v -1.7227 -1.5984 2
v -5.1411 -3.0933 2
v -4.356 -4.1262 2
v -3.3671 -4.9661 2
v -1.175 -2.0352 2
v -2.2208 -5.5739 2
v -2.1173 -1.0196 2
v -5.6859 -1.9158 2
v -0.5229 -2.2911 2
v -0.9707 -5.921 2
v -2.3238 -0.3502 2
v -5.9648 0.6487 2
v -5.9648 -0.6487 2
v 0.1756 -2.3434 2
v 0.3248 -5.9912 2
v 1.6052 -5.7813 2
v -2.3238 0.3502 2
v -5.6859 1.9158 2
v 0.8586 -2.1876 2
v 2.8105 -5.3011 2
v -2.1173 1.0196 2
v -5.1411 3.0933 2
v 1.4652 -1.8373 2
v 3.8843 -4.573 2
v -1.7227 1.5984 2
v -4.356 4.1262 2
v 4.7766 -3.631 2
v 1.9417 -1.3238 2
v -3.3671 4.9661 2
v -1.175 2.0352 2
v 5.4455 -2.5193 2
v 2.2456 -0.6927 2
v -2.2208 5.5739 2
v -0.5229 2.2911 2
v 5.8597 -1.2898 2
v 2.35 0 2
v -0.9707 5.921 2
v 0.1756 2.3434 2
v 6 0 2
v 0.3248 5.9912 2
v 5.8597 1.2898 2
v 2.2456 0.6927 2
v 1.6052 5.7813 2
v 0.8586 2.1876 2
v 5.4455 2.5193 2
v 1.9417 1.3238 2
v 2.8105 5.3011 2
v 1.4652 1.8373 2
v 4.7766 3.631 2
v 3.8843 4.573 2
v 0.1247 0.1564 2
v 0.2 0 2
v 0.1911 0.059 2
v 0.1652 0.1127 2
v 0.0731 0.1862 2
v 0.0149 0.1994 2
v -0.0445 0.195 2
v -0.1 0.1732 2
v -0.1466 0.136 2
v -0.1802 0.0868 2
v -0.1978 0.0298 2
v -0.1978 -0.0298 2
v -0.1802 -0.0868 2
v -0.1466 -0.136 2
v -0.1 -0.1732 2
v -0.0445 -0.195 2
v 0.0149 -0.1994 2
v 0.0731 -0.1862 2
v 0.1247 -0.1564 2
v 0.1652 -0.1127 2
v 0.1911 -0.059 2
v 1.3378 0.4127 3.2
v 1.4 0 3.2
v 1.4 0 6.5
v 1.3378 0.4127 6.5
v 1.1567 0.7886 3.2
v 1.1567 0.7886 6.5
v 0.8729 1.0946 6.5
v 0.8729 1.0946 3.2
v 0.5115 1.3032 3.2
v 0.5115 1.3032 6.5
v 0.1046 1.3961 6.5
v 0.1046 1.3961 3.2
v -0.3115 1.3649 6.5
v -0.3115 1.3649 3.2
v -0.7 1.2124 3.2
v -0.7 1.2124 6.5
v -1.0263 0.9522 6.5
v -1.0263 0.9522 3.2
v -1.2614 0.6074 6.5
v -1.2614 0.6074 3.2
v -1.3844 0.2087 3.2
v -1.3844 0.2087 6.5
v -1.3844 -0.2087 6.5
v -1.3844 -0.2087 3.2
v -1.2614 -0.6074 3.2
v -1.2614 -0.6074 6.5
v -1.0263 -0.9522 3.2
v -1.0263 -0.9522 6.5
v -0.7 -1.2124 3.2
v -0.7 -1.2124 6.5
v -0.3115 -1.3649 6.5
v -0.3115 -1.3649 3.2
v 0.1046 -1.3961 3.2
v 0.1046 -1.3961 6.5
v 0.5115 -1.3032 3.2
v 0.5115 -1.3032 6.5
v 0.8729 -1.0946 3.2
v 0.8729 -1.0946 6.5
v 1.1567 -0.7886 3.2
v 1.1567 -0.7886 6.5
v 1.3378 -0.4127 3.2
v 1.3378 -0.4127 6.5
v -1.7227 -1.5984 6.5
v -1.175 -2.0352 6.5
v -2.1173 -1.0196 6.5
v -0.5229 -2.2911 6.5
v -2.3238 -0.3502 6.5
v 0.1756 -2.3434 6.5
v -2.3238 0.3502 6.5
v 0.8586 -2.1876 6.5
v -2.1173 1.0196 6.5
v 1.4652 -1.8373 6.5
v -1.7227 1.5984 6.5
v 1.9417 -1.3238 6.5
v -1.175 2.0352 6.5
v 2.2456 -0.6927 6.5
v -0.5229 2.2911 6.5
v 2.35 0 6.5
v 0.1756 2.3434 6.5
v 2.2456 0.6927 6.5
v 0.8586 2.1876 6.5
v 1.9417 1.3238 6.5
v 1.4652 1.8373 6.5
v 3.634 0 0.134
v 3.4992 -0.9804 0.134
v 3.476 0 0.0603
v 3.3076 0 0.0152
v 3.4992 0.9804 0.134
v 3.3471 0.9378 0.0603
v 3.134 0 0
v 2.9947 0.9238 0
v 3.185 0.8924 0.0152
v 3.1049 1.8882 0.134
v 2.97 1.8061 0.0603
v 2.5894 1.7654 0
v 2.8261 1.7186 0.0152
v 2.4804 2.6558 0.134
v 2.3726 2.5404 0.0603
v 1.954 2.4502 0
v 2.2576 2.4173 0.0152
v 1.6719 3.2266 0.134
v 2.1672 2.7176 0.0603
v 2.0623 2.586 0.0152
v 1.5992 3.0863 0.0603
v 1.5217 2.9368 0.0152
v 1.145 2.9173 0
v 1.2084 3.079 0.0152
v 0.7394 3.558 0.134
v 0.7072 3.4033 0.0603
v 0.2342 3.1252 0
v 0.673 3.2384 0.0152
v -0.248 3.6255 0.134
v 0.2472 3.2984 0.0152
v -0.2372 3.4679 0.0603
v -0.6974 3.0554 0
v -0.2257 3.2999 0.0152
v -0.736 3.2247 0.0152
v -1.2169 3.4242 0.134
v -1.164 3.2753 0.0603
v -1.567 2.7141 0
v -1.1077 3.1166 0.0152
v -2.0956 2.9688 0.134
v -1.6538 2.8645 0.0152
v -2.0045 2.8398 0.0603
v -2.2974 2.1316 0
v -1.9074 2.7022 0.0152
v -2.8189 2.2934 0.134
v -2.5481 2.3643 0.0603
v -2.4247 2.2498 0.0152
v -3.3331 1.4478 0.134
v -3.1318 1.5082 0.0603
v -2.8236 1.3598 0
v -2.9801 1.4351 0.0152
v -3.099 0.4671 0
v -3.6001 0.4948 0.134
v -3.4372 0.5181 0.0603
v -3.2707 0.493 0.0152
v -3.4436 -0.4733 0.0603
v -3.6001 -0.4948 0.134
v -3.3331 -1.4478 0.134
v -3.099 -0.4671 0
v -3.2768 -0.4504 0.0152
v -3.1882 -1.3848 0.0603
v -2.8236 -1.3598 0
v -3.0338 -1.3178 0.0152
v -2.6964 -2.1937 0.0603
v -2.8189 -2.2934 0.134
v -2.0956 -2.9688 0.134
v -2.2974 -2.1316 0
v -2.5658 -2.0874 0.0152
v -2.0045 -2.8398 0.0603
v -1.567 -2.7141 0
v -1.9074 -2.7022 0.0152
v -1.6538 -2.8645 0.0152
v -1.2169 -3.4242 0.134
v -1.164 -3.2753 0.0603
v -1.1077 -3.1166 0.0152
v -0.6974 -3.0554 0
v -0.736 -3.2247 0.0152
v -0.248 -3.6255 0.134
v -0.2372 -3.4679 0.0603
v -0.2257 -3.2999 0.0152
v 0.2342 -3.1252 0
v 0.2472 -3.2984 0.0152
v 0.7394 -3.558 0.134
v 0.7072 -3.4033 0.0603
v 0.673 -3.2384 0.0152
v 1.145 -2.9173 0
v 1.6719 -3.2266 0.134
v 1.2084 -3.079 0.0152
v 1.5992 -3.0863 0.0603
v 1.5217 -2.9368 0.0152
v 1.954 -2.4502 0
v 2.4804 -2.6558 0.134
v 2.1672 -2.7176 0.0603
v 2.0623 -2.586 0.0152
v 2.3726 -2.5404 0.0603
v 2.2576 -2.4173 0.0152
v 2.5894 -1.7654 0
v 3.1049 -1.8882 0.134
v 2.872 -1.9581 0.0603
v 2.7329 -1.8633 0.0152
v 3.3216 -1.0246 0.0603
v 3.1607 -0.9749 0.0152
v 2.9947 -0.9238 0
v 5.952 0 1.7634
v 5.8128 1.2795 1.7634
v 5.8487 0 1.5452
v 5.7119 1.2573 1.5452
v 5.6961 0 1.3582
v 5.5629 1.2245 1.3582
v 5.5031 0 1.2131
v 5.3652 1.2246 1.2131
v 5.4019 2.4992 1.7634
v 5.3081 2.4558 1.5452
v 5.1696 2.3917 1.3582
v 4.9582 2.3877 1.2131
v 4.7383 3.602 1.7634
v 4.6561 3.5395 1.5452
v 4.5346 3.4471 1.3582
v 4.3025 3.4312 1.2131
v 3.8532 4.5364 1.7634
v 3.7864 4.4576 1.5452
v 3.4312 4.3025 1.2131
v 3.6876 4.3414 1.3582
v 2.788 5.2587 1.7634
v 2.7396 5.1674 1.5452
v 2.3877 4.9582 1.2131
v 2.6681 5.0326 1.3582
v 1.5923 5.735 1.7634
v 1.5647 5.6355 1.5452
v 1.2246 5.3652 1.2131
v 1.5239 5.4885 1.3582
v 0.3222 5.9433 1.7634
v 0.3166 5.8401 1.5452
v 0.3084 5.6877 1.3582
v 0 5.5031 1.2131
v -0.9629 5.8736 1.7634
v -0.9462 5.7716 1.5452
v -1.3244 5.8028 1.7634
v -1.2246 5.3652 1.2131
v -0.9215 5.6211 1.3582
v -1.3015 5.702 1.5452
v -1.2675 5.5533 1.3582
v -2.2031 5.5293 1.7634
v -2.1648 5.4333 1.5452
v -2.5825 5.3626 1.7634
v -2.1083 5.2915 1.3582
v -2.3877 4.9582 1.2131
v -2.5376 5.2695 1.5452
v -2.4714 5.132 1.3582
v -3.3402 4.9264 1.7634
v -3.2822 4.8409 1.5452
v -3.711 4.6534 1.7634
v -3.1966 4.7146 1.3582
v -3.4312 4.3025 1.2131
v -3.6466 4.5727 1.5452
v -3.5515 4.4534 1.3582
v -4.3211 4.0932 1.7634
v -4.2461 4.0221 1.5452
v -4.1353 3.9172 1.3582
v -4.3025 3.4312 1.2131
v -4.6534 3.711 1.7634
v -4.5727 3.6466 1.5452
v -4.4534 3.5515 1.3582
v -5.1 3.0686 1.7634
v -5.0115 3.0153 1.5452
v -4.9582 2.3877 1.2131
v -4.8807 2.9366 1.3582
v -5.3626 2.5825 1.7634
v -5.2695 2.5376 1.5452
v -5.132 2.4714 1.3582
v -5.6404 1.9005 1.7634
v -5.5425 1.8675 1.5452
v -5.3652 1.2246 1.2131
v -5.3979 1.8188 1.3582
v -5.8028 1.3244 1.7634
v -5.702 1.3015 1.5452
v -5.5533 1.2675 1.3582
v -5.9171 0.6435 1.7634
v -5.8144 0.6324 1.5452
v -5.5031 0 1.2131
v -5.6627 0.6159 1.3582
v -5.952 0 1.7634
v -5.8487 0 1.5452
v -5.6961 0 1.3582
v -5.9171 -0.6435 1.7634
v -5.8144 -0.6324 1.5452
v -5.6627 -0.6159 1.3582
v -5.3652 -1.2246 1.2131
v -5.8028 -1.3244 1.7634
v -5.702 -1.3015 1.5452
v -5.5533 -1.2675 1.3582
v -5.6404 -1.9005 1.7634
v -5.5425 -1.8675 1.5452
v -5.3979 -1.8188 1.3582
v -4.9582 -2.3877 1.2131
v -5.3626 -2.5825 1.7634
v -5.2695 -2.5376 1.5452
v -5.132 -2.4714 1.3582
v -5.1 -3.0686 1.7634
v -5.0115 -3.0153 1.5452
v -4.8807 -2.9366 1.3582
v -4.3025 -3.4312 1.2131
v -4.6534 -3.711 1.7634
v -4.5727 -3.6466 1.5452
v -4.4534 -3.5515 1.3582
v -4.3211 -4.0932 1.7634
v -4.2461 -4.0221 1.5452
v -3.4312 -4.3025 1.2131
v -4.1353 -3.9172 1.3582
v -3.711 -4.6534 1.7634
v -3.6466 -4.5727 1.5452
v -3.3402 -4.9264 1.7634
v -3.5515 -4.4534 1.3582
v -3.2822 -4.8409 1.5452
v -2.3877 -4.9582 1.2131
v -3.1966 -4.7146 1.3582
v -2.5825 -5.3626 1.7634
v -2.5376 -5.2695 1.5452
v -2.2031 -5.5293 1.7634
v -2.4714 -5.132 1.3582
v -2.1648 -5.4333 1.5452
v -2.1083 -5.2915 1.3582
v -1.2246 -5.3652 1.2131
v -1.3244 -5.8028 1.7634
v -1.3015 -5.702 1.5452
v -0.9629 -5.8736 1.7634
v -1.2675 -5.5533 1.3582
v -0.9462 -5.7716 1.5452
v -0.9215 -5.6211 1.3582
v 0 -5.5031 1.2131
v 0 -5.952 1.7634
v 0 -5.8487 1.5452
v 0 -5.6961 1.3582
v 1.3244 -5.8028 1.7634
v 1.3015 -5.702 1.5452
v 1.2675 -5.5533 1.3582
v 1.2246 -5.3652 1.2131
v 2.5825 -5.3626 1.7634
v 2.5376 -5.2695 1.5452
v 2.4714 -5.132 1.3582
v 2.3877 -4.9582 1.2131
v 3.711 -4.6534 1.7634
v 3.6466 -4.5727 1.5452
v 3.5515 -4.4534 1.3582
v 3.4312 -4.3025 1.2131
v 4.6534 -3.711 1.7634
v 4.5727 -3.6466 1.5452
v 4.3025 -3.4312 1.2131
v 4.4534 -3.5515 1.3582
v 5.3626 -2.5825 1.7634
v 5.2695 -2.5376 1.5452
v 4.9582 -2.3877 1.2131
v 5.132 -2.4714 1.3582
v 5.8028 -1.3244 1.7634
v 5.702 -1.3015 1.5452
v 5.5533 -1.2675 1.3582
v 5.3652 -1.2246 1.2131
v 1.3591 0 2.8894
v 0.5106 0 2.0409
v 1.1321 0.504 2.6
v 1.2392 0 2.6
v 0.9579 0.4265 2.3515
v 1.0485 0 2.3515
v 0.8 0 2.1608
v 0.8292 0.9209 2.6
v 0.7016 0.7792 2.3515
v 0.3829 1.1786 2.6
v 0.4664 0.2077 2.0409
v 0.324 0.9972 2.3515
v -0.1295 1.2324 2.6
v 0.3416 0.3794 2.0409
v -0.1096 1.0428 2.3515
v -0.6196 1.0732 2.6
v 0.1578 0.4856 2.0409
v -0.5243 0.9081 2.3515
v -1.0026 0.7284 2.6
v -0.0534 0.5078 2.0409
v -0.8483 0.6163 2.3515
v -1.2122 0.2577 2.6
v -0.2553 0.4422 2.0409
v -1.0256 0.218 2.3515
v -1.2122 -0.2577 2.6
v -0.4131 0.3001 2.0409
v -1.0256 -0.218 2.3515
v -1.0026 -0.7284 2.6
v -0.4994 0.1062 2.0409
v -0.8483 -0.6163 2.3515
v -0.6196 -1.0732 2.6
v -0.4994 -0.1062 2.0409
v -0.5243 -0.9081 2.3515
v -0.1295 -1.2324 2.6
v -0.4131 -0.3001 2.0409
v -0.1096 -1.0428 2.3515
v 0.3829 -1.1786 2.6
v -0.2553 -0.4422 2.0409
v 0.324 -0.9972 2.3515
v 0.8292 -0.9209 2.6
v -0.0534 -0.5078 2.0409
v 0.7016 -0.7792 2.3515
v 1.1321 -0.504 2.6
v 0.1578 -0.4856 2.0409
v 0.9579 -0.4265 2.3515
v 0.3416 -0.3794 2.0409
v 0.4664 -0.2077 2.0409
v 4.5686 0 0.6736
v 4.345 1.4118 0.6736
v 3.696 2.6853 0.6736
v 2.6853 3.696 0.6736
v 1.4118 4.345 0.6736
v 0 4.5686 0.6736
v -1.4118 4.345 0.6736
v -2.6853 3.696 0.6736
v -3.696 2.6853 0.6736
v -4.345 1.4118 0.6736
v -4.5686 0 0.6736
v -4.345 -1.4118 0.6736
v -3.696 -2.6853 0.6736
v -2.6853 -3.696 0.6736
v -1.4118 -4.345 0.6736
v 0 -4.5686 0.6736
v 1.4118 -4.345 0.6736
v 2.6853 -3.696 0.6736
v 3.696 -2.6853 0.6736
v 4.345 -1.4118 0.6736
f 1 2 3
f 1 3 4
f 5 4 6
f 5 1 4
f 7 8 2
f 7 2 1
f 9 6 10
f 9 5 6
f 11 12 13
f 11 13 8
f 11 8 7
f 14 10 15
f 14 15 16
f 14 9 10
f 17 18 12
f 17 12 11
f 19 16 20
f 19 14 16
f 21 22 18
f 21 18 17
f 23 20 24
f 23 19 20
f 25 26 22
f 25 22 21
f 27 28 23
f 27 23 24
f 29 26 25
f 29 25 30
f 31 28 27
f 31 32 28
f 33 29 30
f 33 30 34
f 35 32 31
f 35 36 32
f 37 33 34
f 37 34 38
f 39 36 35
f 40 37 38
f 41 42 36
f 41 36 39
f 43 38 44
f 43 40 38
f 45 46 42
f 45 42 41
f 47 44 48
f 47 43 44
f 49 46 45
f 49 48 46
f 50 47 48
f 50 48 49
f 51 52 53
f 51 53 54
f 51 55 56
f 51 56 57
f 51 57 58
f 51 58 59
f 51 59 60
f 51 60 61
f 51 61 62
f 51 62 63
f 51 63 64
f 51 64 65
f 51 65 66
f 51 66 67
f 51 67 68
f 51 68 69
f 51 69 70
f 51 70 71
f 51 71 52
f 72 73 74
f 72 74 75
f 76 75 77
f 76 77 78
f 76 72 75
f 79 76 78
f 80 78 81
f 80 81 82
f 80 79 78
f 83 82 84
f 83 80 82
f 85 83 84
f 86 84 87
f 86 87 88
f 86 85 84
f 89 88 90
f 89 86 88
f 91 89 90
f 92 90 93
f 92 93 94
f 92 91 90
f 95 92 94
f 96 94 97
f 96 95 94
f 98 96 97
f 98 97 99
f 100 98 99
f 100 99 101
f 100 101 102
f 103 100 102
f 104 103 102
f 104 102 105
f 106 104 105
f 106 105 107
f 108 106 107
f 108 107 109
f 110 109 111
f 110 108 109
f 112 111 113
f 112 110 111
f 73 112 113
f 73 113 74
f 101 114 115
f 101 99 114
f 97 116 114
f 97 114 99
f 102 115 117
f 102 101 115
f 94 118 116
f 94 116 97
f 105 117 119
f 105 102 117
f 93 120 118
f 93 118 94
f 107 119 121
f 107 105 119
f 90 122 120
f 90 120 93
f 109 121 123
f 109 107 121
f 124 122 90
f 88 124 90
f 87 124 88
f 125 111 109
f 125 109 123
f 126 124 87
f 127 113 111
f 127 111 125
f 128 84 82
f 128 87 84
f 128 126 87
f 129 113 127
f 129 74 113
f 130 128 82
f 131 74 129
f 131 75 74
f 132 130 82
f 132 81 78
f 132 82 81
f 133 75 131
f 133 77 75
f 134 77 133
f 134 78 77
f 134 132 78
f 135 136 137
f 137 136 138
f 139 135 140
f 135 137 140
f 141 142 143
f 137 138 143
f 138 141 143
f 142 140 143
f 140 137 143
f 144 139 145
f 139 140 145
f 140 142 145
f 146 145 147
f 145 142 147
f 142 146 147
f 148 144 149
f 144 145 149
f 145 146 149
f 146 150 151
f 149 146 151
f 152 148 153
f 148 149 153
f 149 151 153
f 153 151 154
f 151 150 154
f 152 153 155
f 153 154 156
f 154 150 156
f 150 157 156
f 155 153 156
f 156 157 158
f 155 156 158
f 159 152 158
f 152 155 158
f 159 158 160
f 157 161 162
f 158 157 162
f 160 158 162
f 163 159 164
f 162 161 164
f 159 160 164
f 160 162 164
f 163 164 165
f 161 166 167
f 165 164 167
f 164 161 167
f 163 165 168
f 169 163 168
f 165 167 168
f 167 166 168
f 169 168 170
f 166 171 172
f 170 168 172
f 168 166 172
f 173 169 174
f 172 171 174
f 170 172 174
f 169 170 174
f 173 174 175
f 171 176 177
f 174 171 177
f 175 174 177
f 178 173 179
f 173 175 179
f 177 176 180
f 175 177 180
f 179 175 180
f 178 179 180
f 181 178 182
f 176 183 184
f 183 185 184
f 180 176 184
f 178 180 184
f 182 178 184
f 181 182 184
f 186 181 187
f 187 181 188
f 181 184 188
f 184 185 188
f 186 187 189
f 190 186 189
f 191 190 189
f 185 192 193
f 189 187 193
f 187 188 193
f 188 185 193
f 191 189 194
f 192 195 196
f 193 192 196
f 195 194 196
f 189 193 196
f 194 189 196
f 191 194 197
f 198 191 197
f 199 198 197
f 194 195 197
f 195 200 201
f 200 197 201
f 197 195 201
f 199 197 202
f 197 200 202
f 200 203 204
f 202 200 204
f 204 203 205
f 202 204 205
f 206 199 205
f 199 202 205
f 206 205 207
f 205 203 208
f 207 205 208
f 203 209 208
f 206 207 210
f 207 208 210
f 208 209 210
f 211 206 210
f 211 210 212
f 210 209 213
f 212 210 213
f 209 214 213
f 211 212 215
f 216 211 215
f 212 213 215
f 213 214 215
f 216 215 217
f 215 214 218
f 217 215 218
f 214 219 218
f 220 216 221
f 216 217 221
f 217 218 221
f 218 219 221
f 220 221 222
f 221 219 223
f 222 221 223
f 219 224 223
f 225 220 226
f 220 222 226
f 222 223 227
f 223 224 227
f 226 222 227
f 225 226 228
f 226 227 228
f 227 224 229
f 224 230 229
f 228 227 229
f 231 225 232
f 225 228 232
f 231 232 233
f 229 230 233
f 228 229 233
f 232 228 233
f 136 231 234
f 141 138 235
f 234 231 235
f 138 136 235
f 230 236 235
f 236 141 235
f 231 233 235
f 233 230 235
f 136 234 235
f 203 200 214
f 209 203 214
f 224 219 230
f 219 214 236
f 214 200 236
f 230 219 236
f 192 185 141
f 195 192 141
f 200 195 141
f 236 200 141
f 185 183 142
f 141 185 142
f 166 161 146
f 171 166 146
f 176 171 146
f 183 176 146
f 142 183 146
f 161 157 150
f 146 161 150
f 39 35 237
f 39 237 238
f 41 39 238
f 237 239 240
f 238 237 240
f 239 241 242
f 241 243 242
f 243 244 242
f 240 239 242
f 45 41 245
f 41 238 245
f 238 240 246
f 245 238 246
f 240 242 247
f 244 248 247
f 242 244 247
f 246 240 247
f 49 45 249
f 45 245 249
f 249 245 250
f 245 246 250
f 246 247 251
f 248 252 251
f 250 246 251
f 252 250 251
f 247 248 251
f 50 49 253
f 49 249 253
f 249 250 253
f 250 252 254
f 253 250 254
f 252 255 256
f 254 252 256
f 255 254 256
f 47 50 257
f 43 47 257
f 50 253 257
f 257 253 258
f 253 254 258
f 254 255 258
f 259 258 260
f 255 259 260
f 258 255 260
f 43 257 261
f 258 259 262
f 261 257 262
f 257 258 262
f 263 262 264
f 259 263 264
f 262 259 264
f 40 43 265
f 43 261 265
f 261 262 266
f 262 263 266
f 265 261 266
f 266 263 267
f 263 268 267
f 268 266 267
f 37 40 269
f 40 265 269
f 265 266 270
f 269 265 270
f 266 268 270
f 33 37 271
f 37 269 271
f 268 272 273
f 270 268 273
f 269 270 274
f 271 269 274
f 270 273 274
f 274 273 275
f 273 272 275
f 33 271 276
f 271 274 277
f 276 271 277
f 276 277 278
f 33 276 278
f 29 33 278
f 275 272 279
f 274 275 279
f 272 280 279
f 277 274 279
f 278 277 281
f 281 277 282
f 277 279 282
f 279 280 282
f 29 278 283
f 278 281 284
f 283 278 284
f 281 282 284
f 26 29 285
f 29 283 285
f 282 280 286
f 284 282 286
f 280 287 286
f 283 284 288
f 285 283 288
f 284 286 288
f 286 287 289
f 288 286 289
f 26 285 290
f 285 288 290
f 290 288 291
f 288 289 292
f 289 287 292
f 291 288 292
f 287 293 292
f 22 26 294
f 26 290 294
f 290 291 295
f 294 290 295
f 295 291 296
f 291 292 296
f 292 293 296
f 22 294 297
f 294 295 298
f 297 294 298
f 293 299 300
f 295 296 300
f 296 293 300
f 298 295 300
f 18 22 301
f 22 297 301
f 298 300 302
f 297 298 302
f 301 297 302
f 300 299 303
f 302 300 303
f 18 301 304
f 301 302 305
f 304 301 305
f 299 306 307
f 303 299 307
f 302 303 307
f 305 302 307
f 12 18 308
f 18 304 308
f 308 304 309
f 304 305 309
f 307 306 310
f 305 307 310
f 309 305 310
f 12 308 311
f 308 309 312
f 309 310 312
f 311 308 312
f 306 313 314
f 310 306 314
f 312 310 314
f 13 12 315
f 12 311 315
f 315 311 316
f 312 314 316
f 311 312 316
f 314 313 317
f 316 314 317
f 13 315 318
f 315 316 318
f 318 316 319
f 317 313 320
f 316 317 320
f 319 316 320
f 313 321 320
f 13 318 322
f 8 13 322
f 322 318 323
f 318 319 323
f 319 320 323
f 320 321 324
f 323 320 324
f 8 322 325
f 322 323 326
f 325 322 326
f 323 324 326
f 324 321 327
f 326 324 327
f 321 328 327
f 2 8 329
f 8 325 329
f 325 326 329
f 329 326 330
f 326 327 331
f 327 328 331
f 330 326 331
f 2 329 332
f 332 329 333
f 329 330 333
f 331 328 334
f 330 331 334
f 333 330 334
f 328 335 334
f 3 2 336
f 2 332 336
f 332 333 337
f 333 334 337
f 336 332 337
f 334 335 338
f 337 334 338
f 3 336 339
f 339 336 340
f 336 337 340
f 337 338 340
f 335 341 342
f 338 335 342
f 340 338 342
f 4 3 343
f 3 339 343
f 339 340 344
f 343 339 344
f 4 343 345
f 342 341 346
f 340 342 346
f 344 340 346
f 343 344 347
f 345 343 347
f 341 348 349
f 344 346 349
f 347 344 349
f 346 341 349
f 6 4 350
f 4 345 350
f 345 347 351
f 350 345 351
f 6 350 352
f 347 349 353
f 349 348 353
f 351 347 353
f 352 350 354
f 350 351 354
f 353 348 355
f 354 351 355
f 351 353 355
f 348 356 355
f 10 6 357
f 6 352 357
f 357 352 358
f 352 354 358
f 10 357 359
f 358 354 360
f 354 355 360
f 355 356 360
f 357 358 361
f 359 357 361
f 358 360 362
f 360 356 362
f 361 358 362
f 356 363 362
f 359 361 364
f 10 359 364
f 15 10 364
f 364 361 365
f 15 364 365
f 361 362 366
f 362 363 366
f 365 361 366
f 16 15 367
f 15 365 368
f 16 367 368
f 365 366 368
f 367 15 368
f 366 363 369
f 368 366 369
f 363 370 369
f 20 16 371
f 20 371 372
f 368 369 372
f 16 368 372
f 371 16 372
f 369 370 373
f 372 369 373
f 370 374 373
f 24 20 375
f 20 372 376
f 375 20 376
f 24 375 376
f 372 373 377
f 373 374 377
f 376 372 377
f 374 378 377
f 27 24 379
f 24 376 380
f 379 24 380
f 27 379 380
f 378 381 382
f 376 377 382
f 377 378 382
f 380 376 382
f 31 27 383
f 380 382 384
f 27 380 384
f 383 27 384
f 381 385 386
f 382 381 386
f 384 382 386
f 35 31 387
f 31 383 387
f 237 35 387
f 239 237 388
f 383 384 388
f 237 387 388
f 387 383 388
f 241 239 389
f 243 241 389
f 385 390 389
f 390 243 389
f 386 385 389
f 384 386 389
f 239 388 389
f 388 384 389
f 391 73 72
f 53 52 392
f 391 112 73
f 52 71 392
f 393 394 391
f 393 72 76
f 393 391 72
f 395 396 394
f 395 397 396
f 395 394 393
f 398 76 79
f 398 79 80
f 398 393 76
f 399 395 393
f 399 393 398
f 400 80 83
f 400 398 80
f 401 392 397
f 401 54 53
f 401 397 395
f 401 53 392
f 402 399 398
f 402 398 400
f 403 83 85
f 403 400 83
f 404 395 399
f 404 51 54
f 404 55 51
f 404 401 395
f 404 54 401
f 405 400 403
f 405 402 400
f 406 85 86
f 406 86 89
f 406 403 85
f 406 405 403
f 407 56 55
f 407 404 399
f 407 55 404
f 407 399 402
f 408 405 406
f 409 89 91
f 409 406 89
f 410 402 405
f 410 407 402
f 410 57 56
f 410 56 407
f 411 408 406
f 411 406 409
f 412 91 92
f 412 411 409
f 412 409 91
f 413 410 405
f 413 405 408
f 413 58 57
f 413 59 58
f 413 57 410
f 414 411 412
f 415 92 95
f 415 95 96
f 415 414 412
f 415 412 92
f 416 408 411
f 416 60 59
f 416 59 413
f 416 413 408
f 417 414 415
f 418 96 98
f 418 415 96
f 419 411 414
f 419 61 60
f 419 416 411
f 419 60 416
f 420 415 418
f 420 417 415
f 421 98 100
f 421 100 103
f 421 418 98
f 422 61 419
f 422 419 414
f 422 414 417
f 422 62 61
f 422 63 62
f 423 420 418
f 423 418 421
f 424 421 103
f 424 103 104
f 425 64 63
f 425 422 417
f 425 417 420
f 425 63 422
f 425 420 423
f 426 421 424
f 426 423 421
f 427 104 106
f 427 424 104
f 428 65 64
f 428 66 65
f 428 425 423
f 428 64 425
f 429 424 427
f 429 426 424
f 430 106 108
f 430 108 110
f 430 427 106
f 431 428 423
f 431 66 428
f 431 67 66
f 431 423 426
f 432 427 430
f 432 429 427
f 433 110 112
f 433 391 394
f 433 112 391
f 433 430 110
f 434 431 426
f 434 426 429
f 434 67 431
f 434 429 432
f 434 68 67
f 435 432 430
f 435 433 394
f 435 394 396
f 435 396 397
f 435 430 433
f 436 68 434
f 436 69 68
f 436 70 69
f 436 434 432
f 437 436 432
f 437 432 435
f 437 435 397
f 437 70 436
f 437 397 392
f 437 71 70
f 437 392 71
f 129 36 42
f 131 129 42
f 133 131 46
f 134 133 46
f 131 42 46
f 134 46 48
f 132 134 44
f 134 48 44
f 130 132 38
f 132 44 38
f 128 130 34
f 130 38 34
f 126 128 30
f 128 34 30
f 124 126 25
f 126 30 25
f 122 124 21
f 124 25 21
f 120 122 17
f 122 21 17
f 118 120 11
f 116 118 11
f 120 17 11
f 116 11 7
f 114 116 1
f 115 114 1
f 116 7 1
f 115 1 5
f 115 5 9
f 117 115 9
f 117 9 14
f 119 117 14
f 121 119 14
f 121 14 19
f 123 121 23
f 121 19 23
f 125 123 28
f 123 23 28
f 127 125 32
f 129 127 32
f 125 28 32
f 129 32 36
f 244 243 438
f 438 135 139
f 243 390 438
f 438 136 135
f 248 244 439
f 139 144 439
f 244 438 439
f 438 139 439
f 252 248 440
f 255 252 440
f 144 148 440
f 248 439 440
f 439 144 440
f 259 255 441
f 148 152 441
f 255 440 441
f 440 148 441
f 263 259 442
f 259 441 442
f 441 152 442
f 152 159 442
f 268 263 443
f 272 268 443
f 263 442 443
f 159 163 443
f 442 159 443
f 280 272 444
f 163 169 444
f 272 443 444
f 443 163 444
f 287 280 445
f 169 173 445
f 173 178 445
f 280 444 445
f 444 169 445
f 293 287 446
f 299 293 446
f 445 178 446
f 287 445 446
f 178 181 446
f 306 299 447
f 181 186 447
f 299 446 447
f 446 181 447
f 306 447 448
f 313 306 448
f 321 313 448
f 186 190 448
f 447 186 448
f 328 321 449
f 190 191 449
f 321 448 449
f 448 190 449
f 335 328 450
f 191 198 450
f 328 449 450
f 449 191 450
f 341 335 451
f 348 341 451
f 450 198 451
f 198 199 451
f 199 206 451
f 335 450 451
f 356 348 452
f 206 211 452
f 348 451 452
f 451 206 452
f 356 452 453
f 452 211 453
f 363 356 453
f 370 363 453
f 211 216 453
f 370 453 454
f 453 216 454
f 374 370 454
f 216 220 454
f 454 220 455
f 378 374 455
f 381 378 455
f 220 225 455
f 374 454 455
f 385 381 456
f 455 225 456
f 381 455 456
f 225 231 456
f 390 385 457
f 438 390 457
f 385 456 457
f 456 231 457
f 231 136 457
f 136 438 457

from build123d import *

# Parameters (mm, degrees)
F0_R     = 6
F1_DEPTH = 2
F2_SIZE2 = 2.5980762114
F2_SIZE  = 1.5
F4_R     = 2.35
F4_R_2   = 1.4
F5_DEPTH = 4.5
F6_R     = 1.2


# Not quite as in the source:
# - a fillet or chamfer that OpenCascade refuses, or shapes differently, is made with other operations: its cross-section is extruded or revolved along the edge and cut away or added


with BuildPart() as f1:
    # F0 (on Top) → F1 (new body)
    with BuildSketch(Plane.XY):
        Circle(F0_R)
    extrude(amount=F1_DEPTH)

    # F2
    f2_edges = [f1.edges().sort_by_distance(p)[0] for p in [
        (-6, 0, 0),
    ]]
    f2_side = f1.faces().sort_by_distance((-6, 0, 1))[0]
    chamfer(f2_edges, length=F2_SIZE, length2=F2_SIZE2, reference=f2_side)

    # F3: fillet of radius 1 on 2 edges, made by hand

    # F3_s1 → F3_t2 (revolve, cut)
    with BuildSketch(Plane.XZ):
        with BuildLine():
            ThreePointArc((3.6339745962, 0.1339745962), (3.3927936413, 0.0340741737), (3.1339745962, 0))
            Line((3.1339745962, 0), (3.4019237886, 0))
            Line((3.4019237886, 0), (3.6339745962, 0.1339745962))
        make_face()
    revolve(axis=Axis((0, 0, 0), (0, 0, 1)), mode=Mode.SUBTRACT)

    # F3_s3 → F3_t4 (revolve, cut)
    with BuildSketch(Plane.XZ):
        with BuildLine():
            ThreePointArc((6, 2), (5.8486778537, 1.5452494356), (5.5031382462, 1.2131367327))
            Line((5.5031382462, 1.2131367327), (6, 1.5))
            Line((6, 1.5), (6, 2))
        make_face()
    revolve(axis=Axis((0, 0, 1.5), (0, 0, 1)), mode=Mode.SUBTRACT)

    # F4 (on face) → F5 (join)
    with BuildSketch(Plane.XY.offset(2)):
        Circle(F4_R)
        Circle(F4_R_2, mode=Mode.SUBTRACT)
    extrude(amount=F5_DEPTH)

    # F6
    f6_edges = [f1.edges().sort_by_distance(p)[0] for p in [
        (-1.4, 0, 2),
    ]]
    fillet(f6_edges, radius=F6_R)


solid = f1.part
